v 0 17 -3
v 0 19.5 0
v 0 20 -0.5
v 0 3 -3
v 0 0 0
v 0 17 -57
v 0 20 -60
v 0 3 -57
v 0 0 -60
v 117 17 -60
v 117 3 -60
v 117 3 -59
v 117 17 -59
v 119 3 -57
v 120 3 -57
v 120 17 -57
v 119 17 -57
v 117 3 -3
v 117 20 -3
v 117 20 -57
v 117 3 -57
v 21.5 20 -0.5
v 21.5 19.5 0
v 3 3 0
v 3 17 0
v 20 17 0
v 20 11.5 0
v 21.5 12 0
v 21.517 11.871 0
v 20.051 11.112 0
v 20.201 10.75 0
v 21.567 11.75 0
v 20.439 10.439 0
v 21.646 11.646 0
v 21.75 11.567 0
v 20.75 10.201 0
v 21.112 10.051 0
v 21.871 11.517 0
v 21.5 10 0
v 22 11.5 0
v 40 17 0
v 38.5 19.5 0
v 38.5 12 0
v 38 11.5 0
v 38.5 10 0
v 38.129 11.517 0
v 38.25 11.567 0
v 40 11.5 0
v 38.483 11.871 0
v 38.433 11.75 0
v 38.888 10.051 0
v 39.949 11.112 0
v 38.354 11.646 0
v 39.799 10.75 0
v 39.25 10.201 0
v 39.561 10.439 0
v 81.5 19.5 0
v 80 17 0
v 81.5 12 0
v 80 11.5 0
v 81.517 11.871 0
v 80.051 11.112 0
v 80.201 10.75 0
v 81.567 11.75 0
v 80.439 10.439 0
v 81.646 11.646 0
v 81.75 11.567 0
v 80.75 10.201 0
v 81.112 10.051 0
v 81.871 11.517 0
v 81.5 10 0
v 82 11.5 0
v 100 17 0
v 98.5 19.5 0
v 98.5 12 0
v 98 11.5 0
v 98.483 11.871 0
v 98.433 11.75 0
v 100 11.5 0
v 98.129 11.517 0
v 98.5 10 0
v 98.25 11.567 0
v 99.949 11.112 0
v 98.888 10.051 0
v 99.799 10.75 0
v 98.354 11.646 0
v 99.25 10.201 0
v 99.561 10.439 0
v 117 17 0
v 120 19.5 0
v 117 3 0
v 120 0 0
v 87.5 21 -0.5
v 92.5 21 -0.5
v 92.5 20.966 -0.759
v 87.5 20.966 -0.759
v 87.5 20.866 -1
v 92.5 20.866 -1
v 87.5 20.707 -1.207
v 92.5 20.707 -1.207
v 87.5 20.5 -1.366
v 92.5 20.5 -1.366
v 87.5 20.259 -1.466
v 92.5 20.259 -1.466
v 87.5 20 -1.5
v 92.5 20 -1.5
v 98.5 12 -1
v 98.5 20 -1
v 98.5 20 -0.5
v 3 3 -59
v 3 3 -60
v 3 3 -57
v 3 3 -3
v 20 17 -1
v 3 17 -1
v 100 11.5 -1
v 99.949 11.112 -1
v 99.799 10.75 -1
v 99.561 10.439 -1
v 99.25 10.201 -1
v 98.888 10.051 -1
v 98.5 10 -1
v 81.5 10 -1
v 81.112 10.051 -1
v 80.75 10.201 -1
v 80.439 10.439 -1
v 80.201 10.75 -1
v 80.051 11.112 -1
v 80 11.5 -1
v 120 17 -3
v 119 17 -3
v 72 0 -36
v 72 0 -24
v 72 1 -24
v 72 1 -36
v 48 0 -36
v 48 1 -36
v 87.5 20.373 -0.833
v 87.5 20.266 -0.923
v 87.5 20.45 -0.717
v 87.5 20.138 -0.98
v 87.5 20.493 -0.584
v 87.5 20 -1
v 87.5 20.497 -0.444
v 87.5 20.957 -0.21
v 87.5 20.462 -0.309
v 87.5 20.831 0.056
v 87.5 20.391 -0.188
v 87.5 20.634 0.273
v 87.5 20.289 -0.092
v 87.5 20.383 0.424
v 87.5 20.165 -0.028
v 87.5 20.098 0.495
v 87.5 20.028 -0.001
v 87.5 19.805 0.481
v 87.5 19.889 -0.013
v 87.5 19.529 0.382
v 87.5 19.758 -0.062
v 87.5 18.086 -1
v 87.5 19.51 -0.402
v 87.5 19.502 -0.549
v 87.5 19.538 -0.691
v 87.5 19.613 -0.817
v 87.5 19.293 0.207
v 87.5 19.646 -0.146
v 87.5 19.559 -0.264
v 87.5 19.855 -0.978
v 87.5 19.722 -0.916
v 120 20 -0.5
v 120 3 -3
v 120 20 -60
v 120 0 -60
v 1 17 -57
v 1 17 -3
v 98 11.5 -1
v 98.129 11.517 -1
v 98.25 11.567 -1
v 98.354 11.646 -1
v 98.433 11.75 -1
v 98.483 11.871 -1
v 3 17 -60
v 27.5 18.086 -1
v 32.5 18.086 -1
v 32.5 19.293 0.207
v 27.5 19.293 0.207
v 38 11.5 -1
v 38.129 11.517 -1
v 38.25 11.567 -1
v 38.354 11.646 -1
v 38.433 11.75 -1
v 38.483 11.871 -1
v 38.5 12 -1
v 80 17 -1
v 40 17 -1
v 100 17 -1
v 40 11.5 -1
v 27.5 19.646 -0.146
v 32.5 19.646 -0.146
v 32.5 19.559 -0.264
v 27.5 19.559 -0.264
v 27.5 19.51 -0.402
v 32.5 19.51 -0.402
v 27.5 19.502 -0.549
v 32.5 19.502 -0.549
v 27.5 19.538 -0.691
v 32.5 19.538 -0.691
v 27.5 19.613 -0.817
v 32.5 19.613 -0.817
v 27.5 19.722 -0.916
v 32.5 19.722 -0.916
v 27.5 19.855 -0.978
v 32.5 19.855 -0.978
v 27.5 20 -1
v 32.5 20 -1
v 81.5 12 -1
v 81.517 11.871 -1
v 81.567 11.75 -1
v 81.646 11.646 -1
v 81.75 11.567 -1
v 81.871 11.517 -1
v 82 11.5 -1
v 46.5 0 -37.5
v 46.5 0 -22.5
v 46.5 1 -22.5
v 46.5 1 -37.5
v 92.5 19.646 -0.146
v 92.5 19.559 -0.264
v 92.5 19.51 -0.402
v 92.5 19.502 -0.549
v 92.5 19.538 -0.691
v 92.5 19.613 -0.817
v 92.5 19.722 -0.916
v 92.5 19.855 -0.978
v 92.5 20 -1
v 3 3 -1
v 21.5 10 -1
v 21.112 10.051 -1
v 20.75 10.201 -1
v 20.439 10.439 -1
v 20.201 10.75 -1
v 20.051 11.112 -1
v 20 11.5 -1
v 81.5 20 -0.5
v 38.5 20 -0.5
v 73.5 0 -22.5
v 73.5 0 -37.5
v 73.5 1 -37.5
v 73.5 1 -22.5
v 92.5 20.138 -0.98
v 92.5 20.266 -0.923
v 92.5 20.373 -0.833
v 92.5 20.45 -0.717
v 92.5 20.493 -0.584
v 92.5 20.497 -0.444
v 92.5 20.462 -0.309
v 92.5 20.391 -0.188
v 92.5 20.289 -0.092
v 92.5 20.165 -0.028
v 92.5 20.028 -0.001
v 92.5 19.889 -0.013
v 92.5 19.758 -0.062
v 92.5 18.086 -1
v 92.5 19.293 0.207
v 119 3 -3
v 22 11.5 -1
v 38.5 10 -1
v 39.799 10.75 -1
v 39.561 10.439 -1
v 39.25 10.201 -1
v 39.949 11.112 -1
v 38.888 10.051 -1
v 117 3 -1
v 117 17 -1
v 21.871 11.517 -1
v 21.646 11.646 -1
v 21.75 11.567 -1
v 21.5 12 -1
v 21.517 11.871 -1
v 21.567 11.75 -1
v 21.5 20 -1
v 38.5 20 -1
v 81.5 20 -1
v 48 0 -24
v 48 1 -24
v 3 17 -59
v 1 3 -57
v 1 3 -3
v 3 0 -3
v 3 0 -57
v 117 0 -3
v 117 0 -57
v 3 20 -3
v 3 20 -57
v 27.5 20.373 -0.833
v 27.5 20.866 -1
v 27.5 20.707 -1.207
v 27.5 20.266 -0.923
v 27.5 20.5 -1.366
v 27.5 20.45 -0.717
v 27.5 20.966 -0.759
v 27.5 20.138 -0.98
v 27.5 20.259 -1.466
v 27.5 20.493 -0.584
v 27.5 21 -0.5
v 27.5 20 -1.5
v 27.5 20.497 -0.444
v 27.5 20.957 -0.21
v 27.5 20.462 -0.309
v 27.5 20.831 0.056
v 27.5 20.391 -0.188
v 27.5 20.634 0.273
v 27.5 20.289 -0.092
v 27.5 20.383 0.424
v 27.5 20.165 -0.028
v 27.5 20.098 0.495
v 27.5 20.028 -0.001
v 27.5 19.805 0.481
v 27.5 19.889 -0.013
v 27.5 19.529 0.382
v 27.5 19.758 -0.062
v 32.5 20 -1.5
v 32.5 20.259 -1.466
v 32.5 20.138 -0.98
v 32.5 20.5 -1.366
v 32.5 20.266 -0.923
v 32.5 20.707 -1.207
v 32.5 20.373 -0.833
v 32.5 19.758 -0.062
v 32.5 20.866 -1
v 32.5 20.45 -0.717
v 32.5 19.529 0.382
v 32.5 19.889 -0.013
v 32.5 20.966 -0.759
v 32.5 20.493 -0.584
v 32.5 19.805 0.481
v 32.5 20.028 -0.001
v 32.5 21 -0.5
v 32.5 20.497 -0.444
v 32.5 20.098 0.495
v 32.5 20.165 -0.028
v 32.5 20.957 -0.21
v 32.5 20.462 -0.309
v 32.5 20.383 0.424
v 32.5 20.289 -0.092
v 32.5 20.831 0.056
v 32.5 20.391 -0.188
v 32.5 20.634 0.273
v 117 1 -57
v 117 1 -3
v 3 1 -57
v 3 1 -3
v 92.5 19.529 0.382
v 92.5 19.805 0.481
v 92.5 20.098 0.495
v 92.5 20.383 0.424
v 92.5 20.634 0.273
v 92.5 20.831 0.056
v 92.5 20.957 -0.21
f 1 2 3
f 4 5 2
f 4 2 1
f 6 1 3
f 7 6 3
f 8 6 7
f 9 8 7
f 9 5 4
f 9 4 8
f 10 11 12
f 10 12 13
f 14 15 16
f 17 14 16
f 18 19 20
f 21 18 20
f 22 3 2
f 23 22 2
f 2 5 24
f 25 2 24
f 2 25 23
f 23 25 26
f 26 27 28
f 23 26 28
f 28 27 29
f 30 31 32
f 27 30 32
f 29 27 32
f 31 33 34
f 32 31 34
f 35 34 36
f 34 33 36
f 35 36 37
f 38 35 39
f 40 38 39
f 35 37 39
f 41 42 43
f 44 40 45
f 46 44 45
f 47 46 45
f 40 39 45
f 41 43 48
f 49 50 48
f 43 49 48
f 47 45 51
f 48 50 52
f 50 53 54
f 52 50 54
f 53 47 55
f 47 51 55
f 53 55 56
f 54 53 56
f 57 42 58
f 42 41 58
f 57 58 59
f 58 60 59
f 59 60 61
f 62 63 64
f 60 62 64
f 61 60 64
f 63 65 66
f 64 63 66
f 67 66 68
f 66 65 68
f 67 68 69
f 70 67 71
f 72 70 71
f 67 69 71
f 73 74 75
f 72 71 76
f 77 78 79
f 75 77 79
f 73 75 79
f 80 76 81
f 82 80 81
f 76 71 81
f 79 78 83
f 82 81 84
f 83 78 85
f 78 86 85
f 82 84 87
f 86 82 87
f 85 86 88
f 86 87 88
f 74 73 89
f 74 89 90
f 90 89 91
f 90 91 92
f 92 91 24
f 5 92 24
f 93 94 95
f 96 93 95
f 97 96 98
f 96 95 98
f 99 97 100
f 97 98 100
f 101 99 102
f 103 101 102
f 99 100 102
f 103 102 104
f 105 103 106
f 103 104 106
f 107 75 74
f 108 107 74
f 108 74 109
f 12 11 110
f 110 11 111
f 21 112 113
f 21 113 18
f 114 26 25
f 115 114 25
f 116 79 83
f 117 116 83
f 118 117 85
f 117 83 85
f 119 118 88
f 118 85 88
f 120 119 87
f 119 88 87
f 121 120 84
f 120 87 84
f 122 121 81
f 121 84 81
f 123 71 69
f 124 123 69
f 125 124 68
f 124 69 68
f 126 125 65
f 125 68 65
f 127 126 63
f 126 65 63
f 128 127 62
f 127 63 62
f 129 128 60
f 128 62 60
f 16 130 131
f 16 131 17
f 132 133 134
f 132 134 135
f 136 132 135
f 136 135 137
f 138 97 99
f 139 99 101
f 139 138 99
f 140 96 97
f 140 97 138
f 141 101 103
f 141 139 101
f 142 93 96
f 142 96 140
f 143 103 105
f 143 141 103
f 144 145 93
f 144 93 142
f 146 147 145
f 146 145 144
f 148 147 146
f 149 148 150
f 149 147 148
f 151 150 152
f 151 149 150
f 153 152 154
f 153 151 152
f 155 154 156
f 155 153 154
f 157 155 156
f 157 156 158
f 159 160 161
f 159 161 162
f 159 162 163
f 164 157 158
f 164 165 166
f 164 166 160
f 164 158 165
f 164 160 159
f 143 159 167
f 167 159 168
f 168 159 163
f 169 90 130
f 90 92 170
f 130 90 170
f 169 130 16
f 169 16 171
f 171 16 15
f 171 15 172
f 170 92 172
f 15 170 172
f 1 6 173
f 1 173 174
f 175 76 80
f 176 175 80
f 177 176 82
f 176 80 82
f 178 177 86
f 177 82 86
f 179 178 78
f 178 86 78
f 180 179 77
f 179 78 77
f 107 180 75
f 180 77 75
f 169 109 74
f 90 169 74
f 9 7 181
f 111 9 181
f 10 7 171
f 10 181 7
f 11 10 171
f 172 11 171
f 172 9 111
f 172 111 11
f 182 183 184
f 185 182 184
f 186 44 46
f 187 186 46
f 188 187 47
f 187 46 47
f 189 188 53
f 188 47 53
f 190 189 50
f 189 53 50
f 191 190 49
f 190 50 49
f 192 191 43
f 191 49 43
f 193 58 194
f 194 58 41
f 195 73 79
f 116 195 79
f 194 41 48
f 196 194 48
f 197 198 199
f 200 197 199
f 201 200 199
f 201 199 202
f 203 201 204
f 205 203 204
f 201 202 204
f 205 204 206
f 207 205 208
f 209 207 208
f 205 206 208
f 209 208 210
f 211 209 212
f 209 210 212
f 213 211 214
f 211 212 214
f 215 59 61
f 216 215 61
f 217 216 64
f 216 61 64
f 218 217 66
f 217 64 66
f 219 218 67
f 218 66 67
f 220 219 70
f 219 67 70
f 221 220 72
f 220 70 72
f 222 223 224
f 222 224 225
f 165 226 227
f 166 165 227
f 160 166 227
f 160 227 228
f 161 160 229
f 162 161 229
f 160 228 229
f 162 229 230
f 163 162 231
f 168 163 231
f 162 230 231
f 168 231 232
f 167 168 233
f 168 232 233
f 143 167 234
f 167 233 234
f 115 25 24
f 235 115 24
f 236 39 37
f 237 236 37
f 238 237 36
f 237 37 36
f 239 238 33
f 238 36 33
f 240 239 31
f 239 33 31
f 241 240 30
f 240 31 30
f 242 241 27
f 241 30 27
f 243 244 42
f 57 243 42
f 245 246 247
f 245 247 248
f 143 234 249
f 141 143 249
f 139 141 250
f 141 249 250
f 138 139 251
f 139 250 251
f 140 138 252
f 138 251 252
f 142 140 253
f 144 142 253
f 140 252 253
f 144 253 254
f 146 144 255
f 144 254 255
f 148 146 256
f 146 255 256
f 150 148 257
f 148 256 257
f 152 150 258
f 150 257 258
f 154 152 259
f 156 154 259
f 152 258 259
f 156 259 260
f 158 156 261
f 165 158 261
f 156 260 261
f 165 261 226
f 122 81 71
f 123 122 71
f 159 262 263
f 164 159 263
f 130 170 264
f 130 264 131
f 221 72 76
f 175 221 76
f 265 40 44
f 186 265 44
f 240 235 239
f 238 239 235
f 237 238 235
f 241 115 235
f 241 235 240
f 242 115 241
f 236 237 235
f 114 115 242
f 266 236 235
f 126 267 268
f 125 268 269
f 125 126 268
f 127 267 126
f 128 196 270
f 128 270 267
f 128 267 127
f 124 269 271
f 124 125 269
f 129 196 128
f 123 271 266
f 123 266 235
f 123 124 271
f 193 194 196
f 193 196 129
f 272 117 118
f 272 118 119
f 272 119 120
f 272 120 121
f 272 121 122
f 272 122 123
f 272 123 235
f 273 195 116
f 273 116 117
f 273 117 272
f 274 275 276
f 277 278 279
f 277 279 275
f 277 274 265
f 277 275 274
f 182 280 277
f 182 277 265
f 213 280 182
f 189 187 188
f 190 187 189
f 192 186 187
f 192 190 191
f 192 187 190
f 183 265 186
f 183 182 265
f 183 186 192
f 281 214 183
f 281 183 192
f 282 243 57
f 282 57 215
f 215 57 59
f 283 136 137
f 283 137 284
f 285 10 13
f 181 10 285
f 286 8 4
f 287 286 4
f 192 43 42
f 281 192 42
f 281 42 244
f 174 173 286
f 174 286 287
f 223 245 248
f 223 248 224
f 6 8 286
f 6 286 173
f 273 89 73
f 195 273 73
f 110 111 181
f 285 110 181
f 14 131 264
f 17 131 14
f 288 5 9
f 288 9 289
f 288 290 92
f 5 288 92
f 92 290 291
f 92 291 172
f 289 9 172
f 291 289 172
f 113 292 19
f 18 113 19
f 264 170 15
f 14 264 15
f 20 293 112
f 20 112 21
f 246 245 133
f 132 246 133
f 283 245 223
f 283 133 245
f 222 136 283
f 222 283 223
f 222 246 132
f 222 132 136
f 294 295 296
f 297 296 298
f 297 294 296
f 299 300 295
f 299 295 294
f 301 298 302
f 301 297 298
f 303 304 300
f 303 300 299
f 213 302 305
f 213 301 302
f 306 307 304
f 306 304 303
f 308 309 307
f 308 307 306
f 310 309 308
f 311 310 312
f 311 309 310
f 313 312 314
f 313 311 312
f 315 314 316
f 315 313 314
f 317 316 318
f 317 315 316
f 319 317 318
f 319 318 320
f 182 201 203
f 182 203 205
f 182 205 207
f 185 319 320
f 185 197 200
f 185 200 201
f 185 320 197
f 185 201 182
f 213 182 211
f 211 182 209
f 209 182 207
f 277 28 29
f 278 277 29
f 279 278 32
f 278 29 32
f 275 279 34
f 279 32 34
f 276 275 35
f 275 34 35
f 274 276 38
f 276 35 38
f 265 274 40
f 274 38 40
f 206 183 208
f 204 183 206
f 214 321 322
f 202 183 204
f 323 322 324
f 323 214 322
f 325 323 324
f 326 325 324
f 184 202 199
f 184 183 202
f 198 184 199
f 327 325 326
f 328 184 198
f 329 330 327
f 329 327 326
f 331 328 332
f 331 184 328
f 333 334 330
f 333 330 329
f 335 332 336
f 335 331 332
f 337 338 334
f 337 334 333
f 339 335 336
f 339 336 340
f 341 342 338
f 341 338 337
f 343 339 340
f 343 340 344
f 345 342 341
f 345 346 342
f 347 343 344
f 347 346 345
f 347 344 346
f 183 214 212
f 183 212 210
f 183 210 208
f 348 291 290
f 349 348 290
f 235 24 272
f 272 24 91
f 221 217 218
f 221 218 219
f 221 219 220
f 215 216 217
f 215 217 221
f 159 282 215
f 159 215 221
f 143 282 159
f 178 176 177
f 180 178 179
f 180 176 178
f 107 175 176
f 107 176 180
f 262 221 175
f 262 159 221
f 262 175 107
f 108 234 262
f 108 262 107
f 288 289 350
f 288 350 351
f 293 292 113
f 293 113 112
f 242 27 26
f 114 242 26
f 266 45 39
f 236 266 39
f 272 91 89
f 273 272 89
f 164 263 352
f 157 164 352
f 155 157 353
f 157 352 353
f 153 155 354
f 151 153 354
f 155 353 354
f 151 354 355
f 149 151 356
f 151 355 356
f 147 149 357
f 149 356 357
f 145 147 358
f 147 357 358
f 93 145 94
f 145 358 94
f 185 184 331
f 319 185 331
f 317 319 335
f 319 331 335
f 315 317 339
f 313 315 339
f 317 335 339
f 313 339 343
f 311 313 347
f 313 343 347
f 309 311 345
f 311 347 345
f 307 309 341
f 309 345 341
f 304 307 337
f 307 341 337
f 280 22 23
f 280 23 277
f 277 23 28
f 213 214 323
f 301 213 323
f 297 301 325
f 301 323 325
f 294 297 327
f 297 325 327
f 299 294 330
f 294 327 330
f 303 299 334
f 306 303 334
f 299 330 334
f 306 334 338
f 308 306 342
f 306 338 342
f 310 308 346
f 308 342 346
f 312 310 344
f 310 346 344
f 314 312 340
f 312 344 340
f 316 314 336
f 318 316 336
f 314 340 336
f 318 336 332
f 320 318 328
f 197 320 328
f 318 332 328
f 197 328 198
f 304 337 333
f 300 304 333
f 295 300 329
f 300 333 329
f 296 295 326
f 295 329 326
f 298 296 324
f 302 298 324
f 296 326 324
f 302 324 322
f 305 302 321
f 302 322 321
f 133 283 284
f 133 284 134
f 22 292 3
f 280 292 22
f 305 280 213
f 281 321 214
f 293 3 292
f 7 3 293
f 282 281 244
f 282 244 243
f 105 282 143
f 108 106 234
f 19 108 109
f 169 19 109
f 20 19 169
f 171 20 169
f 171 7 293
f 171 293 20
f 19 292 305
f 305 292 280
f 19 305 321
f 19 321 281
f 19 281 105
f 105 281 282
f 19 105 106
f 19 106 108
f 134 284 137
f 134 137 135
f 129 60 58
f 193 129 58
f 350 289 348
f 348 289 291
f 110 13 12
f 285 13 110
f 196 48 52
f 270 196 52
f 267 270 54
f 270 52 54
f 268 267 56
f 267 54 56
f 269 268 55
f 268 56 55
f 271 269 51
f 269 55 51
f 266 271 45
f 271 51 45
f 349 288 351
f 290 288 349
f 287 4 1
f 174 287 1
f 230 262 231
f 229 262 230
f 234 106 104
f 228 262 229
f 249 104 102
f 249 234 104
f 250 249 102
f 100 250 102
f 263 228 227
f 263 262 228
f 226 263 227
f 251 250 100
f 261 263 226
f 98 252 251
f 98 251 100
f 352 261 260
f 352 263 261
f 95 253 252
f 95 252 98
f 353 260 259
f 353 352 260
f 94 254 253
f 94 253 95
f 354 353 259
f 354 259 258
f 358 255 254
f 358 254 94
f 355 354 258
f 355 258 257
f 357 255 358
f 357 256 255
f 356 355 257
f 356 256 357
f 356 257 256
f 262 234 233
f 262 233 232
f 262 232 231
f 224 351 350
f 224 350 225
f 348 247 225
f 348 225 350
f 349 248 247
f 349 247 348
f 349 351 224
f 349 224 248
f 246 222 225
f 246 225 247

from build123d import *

# Parameters (mm, degrees)
SKETCH1_W                = 120
SKETCH1_H                = 60
BOSS_EXTRUDE1_DEPTH      = 20
SKETCH2_W                = 114
SKETCH2_H                = 54
CUT_EXTRUDE1_DEPTH       = 17
CUT_EXTRUDE2_DEPTH       = 1
CUT_EXTRUDE3_DEPTH       = 1
SKETCH5_W                = 54
SKETCH5_H                = 14
CUT_EXTRUDE4_DEPTH       = 1
SKETCH6_W                = 54
SKETCH6_H                = 14
CUT_EXTRUDE5_DEPTH       = 1
SKETCH7_W                = 114
SKETCH7_H                = 14
CUT_EXTRUDE6_DEPTH       = 1
SKETCH8_W                = 114
SKETCH8_H                = 54
CUT_EXTRUDE7_DEPTH       = 1
BOSS_EXTRUDE2_DEPTH      = 3
BOSS_EXTRUDE2_DEPTH_BACK = 0.5
CUT_EXTRUDE8_DEPTH       = 5
BOSS_EXTRUDE3_DEPTH      = 2
BOSS_EXTRUDE3_DEPTH_BACK = 0.5
CUT_EXTRUDE9_DEPTH       = 5
CUT_EXTRUDE10_DEPTH      = 23
CUT_EXTRUDE11_DEPTH      = 43
CUT_EXTRUDE12_DEPTH      = 43
BOSS_EXTRUDE5_DEPTH      = 1


with BuildPart() as part:
    # Sketch1 → Boss-Extrude1 (new body)
    with BuildSketch(Plane(origin=(0, 0, 0), x_dir=(1, 0, 0), z_dir=(0, 1, 0))):
        with Locations((60, 30)):
            Rectangle(SKETCH1_W, SKETCH1_H)
    extrude(amount=BOSS_EXTRUDE1_DEPTH)

    # Sketch2 → Cut-Extrude1 (cut)
    with BuildSketch(Plane(origin=(0, 20, 0), x_dir=(1, 0, 0), z_dir=(0, 1, 0))):
        with Locations((60, 30)):
            Rectangle(SKETCH2_W, SKETCH2_H)
    extrude(amount=-CUT_EXTRUDE1_DEPTH, mode=Mode.SUBTRACT)

    # Sketch3 → Cut-Extrude2 (cut)
    with BuildSketch(Plane.XY):
        with BuildLine():
            Line((38.5, 20), (21.5, 20))
            Line((21.5, 20), (21.5, 12))
            ThreePointArc((21.5, 12), (21.646446609, 11.646446609), (22, 11.5))
            Line((22, 11.5), (38, 11.5))
            ThreePointArc((38, 11.5), (38.353553391, 11.646446609), (38.5, 12))
            Line((38.5, 12), (38.5, 20))
        make_face()
        with BuildLine():
            Line((98.5, 12), (98.5, 20))
            Line((98.5, 20), (81.5, 20))
            Line((81.5, 20), (81.5, 12))
            ThreePointArc((81.5, 12), (81.646446609, 11.646446609), (82, 11.5))
            Line((82, 11.5), (98, 11.5))
            ThreePointArc((98, 11.5), (98.353553391, 11.646446609), (98.5, 12))
        make_face()
    extrude(amount=-CUT_EXTRUDE2_DEPTH, mode=Mode.SUBTRACT)

    # Sketch4 → Cut-Extrude3 (cut)
    with BuildSketch(Plane.XY):
        with BuildLine():
            Line((20, 17), (3, 17))
            Line((3, 17), (3, 3))
            Line((3, 3), (117, 3))
            Line((117, 3), (117, 17))
            Line((117, 17), (100, 17))
            Line((100, 17), (100, 11.5))
            ThreePointArc((100, 11.5), (99.560660172, 10.439339828), (98.5, 10))
            Line((98.5, 10), (81.5, 10))
            ThreePointArc((81.5, 10), (80.439339828, 10.439339828), (80, 11.5))
            Line((80, 11.5), (80, 17))
            Line((80, 17), (60, 17))
            Line((60, 17), (40, 17))
            Line((40, 17), (40, 11.5))
            ThreePointArc((40, 11.5), (39.560660172, 10.439339828), (38.5, 10))
            Line((38.5, 10), (21.5, 10))
            ThreePointArc((21.5, 10), (20.439339828, 10.439339828), (20, 11.5))
            Line((20, 11.5), (20, 17))
        make_face()
    extrude(amount=-CUT_EXTRUDE3_DEPTH, mode=Mode.SUBTRACT)

    # Sketch5 → Cut-Extrude4 (cut)
    with BuildSketch(Plane.ZY):
        with Locations((-30, 10)):
            Rectangle(SKETCH5_W, SKETCH5_H)
    extrude(amount=-CUT_EXTRUDE4_DEPTH, mode=Mode.SUBTRACT)

    # Sketch6 → Cut-Extrude5 (cut)
    with BuildSketch(Plane(origin=(120, 0, 0), x_dir=(0, 0, -1), z_dir=(1, 0, 0))):
        with Locations((30, 10)):
            Rectangle(SKETCH6_W, SKETCH6_H)
    extrude(amount=-CUT_EXTRUDE5_DEPTH, mode=Mode.SUBTRACT)

    # Sketch7 → Cut-Extrude6 (cut)
    with BuildSketch(Plane(origin=(0, 0, -60), x_dir=(-1, 0, 0), z_dir=(0, 0, -1))):
        with Locations((-60, 10)):
            Rectangle(SKETCH7_W, SKETCH7_H)
    extrude(amount=-CUT_EXTRUDE6_DEPTH, mode=Mode.SUBTRACT)

    # Sketch8 → Cut-Extrude7 (cut)
    with BuildSketch(Plane.XZ):
        with Locations((60, -30)):
            Rectangle(SKETCH8_W, SKETCH8_H)
    extrude(amount=-CUT_EXTRUDE7_DEPTH, mode=Mode.SUBTRACT)

    # Sketch9 → Boss-Extrude2 (add, two sides)
    with BuildSketch(Plane.XY.offset(-1)) as boss_extrude2_sk:
        Polygon((32.5, 20), (30, 20), (27.5, 20), (27.5, 18), (32.5, 18), align=None)
        Polygon((27.5, 20), (30, 20), (32.5, 20), (32.5, 21), (27.5, 21), align=None)
    extrude(amount=BOSS_EXTRUDE2_DEPTH)
    extrude(boss_extrude2_sk.sketch, amount=-BOSS_EXTRUDE2_DEPTH_BACK)

    # Sketch11 → Cut-Extrude8 (cut)
    with BuildSketch(Plane(origin=(32.5, 0, 0), x_dir=(0, 0, -1), z_dir=(1, 0, 0))):
        with BuildLine():
            Line((1, 18.085786438), (-0.207106781, 19.292893219))
            ThreePointArc((-0.207106781, 19.292893219), (-0.423879533, 20.382683432), (0.5, 21))
            Line((0.5, 21), (-2, 21))
            Line((-2, 21), (-2, 18))
            Line((-2, 18), (1, 18))
            Line((1, 18), (1, 18.085786438))
        make_face()
        with BuildLine():
            ThreePointArc((0.5, 21), (1.207106781, 20.707106781), (1.5, 20))
            Line((1.5, 20), (1.5, 21))
            Line((1.5, 21), (0.5, 21))
        make_face()
        with BuildLine():
            ThreePointArc((0.146446609, 19.646446609), (0.691341716, 19.538060234), (1, 20))
            Line((1, 20), (0.5, 20))
            Line((0.5, 20), (0.146446609, 19.646446609))
        make_face()
        with BuildLine():
            Line((0.5, 20), (1, 20))
            ThreePointArc((1, 20), (0.308658284, 20.461939766), (0.146446609, 19.646446609))
            Line((0.146446609, 19.646446609), (0.5, 20))
        make_face()
    extrude(amount=-CUT_EXTRUDE8_DEPTH, mode=Mode.SUBTRACT)

    # Sketch12 → Boss-Extrude3 (add, two sides)
    with BuildSketch(Plane.XY.offset(-1)) as boss_extrude3_sk:
        Polygon((87.5, 21), (87.5, 20), (87.5, 18), (92.5, 18), (92.5, 21), align=None)
    extrude(amount=BOSS_EXTRUDE3_DEPTH)
    extrude(boss_extrude3_sk.sketch, amount=-BOSS_EXTRUDE3_DEPTH_BACK)

    # Sketch13 → Cut-Extrude9 (cut)
    with BuildSketch(Plane(origin=(92.5, 0, 0), x_dir=(0, 0, -1), z_dir=(1, 0, 0))):
        with BuildLine():
            Line((1, 18.085786438), (-0.207106781, 19.292893219))
            ThreePointArc((-0.207106781, 19.292893219), (-0.423879533, 20.382683432), (0.5, 21))
            Line((0.5, 21), (-1, 21))
            Line((-1, 21), (-1, 18))
            Line((-1, 18), (1, 18))
            Line((1, 18), (1, 18.085786438))
        make_face()
        with BuildLine():
            ThreePointArc((0.146446609, 19.646446609), (0.691341716, 19.538060234), (1, 20))
            Line((1, 20), (0.5, 20))
            Line((0.5, 20), (0.146446609, 19.646446609))
        make_face()
        with BuildLine():
            Line((0.5, 20), (1, 20))
            ThreePointArc((1, 20), (0.308658284, 20.461939766), (0.146446609, 19.646446609))
            Line((0.146446609, 19.646446609), (0.5, 20))
        make_face()
        with BuildLine():
            ThreePointArc((0.5, 21), (1.207106781, 20.707106781), (1.5, 20))
            Line((1.5, 20), (1.5, 21))
            Line((1.5, 21), (0.5, 21))
        make_face()
    extrude(amount=-CUT_EXTRUDE9_DEPTH, mode=Mode.SUBTRACT)

    # Sketch14 → Cut-Extrude10 (cut)
    with BuildSketch(Plane.ZY):
        Polygon((0, 19.5), (0, 20), (-0.5, 20), align=None)
    extrude(amount=-CUT_EXTRUDE10_DEPTH, mode=Mode.SUBTRACT)

    # Sketch15 → Cut-Extrude11 (cut)
    with BuildSketch(Plane.ZY.offset(-38.5)):
        Polygon((0, 20), (-0.5, 20), (0, 19.5), align=None)
    extrude(amount=-CUT_EXTRUDE11_DEPTH, mode=Mode.SUBTRACT)

    # Sketch16 → Cut-Extrude12 (cut)
    with BuildSketch(Plane.ZY.offset(-98.5)):
        Polygon((0, 20), (-0.5, 20), (0, 19.5), align=None)
    extrude(amount=-CUT_EXTRUDE12_DEPTH, mode=Mode.SUBTRACT)

    # Sketch18 → Boss-Extrude5 (add)
    with BuildSketch(Plane(origin=(0, 0, 0), x_dir=(-1, 0, 0), z_dir=(0, -1, 0))):
        Polygon((-46.5, 36.75), (-48, 36), (-48, 24), (-60, 24), (-60, 22.5), (-46.5, 22.5), align=None)
        Polygon((-60, 24), (-72, 24), (-73.5, 23.25), (-73.5, 22.5), (-60, 22.5), align=None)
        Polygon((-72, 36), (-48, 36), (-46.5, 36.75), (-46.5, 37.5), (-73.5, 37.5), (-73.5, 23.25), (-72, 24), align=None)
    extrude(amount=-BOSS_EXTRUDE5_DEPTH)


solid = part.part
